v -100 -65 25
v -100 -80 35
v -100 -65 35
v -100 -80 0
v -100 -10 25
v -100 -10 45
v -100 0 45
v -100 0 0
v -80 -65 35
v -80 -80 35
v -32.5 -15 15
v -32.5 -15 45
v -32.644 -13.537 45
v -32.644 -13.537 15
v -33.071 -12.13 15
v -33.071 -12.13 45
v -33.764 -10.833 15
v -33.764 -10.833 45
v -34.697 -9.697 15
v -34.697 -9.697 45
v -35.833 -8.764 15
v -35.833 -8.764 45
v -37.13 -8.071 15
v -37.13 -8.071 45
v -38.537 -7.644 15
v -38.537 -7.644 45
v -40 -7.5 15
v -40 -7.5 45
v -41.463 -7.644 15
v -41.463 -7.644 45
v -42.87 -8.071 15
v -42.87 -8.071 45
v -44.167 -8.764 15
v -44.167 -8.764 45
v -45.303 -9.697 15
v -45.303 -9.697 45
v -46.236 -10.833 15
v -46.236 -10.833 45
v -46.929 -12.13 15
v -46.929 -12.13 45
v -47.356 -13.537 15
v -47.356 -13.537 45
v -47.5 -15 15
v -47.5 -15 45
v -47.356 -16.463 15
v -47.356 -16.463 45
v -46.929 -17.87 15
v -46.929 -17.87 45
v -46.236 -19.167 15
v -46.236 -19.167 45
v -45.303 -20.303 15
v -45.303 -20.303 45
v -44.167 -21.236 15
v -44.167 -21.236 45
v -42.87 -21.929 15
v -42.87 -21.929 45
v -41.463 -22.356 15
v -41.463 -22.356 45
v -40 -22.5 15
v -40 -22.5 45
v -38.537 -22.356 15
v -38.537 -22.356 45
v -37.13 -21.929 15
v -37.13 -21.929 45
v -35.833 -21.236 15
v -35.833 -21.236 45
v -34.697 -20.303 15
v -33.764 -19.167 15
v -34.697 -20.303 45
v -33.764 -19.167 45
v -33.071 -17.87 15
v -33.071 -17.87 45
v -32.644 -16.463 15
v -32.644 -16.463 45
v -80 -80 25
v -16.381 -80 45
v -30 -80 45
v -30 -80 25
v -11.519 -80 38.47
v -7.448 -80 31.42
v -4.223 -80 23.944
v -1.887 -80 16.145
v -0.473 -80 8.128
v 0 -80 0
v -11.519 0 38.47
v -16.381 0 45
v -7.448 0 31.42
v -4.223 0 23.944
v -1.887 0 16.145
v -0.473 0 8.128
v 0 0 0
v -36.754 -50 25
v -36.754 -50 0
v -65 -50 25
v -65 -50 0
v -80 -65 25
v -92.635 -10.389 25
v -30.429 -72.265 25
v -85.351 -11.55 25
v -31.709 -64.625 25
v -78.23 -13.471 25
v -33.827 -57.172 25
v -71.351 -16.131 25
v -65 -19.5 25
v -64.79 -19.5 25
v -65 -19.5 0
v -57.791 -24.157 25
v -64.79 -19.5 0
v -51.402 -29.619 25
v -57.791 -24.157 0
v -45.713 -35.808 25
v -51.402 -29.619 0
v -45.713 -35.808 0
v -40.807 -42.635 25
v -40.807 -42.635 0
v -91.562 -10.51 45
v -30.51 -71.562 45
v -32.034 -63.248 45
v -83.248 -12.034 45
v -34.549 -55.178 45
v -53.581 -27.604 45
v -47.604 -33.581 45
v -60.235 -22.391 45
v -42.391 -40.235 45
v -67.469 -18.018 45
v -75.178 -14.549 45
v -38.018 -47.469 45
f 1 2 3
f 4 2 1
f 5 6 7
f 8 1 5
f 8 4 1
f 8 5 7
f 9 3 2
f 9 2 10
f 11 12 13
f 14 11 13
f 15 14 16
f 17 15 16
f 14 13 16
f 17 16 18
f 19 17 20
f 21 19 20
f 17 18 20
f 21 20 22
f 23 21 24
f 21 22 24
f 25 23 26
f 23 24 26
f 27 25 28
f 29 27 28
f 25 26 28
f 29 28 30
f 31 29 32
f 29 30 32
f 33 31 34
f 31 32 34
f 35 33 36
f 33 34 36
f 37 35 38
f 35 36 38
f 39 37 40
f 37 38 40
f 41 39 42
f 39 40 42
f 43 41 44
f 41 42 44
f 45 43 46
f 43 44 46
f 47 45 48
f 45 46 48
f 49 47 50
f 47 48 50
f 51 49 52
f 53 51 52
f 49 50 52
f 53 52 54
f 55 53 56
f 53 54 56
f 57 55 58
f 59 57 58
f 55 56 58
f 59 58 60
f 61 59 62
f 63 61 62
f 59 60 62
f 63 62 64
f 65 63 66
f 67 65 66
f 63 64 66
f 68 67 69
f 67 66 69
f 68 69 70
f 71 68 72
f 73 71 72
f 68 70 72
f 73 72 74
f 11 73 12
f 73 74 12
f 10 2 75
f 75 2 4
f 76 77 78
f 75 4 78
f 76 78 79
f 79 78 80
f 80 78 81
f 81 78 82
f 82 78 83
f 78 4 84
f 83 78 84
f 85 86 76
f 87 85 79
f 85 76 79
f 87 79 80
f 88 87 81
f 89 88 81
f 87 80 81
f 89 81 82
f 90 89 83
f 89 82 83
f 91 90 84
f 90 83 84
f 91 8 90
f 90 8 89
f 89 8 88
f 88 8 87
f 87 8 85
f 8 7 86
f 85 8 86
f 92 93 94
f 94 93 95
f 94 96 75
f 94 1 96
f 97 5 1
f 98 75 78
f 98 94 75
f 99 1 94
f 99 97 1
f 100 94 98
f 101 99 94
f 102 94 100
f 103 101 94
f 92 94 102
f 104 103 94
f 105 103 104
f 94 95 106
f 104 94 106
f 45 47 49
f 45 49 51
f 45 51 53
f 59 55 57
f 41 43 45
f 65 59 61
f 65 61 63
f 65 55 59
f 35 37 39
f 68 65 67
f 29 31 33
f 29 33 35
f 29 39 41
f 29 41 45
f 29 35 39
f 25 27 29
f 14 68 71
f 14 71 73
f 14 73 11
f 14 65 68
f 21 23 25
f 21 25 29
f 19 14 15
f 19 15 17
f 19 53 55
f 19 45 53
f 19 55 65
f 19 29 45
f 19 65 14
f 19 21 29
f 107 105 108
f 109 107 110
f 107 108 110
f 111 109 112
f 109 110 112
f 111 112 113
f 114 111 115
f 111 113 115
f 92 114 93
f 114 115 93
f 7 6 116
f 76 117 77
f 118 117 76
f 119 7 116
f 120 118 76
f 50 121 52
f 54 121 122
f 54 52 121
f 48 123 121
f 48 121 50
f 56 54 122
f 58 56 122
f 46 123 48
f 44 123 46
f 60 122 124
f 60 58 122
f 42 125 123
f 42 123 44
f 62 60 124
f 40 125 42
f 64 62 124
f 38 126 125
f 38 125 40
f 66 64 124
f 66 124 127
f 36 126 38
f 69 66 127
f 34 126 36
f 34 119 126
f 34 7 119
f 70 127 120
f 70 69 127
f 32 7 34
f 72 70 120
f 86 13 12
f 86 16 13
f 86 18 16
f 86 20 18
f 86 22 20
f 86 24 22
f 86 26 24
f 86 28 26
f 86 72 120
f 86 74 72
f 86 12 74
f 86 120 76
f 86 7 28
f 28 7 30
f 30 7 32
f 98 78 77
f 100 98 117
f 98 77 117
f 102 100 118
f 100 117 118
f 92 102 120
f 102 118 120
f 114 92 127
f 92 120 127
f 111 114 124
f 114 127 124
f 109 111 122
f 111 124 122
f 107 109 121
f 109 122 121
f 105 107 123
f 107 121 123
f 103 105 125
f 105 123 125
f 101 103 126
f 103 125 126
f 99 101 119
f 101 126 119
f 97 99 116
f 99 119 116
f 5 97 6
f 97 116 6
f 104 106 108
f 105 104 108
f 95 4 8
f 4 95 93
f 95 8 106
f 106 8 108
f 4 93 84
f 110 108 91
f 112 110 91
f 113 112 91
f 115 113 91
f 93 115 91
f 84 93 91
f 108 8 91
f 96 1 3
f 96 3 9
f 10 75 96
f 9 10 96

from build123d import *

# Parameters (mm, degrees)
F0_W      = 100
F0_H      = 45
F1_DEPTH  = 80
F3_DEPTH  = 80
F5_DEPTH  = 20
F6_W      = 20
F6_H      = 15
F7_DEPTH  = 10
F8_R      = 7.5
F9_DEPTH  = 30
F11_DEPTH = 25


with BuildPart() as f1:
    # F0 (on Front) → F1 (new body)
    with BuildSketch(Plane.XZ):
        with Locations((-50, 22.5)):
            Rectangle(F0_W, F0_H)
    extrude(amount=F1_DEPTH)

    # F2 (on face) → F3 (cut, through all)
    with BuildSketch(Plane.XZ.offset(80)):
        with BuildLine():
            ThreePointArc((-16.3809735262, 45), (-4.2226032243, 23.944395449), (0, 0))
            Line((0, 0), (0, 45))
            Line((0, 45), (-16.3809735262, 45))
        make_face()
    extrude(amount=-F3_DEPTH, mode=Mode.SUBTRACT)

    # F4 (on face) → F5 (cut)
    with BuildSketch(Plane.XY.offset(45)):
        with BuildLine():
            Line((-100, -80), (-30, -80))
            ThreePointArc((-30, -80), (-50.5025253169, -30.5025253169), (-100, -10))
            Line((-100, -10), (-100, -80))
        make_face()
    extrude(amount=-F5_DEPTH, mode=Mode.SUBTRACT)

    # F6 (on face) → F7 (join)
    with BuildSketch(Plane.XY.offset(25)):
        with Locations((-90, -72.5)):
            Rectangle(F6_W, F6_H)
    extrude(amount=F7_DEPTH)

    # F8 (on face) → F9 (cut)
    with BuildSketch(Plane.XY.offset(45)):
        with Locations((-40, -15)):
            Circle(F8_R)
    extrude(amount=-F9_DEPTH, mode=Mode.SUBTRACT)

    # F10 (on face) → F11 (cut)
    with BuildSketch(Plane(origin=(0, 0, 0), x_dir=(1, 0, 0), z_dir=(0, 0, -1))):
        with BuildLine():
            Line((-36.7544467966, 50), (-65, 50))
            Line((-65, 50), (-65, 19.5))
            Line((-65, 19.5), (-64.7899162171, 19.5))
            ThreePointArc((-64.7899162171, 19.5), (-48.4641812562, 32.6284960508), (-36.7544467966, 50))
        make_face()
    extrude(amount=-F11_DEPTH, mode=Mode.SUBTRACT)


solid = f1.part
